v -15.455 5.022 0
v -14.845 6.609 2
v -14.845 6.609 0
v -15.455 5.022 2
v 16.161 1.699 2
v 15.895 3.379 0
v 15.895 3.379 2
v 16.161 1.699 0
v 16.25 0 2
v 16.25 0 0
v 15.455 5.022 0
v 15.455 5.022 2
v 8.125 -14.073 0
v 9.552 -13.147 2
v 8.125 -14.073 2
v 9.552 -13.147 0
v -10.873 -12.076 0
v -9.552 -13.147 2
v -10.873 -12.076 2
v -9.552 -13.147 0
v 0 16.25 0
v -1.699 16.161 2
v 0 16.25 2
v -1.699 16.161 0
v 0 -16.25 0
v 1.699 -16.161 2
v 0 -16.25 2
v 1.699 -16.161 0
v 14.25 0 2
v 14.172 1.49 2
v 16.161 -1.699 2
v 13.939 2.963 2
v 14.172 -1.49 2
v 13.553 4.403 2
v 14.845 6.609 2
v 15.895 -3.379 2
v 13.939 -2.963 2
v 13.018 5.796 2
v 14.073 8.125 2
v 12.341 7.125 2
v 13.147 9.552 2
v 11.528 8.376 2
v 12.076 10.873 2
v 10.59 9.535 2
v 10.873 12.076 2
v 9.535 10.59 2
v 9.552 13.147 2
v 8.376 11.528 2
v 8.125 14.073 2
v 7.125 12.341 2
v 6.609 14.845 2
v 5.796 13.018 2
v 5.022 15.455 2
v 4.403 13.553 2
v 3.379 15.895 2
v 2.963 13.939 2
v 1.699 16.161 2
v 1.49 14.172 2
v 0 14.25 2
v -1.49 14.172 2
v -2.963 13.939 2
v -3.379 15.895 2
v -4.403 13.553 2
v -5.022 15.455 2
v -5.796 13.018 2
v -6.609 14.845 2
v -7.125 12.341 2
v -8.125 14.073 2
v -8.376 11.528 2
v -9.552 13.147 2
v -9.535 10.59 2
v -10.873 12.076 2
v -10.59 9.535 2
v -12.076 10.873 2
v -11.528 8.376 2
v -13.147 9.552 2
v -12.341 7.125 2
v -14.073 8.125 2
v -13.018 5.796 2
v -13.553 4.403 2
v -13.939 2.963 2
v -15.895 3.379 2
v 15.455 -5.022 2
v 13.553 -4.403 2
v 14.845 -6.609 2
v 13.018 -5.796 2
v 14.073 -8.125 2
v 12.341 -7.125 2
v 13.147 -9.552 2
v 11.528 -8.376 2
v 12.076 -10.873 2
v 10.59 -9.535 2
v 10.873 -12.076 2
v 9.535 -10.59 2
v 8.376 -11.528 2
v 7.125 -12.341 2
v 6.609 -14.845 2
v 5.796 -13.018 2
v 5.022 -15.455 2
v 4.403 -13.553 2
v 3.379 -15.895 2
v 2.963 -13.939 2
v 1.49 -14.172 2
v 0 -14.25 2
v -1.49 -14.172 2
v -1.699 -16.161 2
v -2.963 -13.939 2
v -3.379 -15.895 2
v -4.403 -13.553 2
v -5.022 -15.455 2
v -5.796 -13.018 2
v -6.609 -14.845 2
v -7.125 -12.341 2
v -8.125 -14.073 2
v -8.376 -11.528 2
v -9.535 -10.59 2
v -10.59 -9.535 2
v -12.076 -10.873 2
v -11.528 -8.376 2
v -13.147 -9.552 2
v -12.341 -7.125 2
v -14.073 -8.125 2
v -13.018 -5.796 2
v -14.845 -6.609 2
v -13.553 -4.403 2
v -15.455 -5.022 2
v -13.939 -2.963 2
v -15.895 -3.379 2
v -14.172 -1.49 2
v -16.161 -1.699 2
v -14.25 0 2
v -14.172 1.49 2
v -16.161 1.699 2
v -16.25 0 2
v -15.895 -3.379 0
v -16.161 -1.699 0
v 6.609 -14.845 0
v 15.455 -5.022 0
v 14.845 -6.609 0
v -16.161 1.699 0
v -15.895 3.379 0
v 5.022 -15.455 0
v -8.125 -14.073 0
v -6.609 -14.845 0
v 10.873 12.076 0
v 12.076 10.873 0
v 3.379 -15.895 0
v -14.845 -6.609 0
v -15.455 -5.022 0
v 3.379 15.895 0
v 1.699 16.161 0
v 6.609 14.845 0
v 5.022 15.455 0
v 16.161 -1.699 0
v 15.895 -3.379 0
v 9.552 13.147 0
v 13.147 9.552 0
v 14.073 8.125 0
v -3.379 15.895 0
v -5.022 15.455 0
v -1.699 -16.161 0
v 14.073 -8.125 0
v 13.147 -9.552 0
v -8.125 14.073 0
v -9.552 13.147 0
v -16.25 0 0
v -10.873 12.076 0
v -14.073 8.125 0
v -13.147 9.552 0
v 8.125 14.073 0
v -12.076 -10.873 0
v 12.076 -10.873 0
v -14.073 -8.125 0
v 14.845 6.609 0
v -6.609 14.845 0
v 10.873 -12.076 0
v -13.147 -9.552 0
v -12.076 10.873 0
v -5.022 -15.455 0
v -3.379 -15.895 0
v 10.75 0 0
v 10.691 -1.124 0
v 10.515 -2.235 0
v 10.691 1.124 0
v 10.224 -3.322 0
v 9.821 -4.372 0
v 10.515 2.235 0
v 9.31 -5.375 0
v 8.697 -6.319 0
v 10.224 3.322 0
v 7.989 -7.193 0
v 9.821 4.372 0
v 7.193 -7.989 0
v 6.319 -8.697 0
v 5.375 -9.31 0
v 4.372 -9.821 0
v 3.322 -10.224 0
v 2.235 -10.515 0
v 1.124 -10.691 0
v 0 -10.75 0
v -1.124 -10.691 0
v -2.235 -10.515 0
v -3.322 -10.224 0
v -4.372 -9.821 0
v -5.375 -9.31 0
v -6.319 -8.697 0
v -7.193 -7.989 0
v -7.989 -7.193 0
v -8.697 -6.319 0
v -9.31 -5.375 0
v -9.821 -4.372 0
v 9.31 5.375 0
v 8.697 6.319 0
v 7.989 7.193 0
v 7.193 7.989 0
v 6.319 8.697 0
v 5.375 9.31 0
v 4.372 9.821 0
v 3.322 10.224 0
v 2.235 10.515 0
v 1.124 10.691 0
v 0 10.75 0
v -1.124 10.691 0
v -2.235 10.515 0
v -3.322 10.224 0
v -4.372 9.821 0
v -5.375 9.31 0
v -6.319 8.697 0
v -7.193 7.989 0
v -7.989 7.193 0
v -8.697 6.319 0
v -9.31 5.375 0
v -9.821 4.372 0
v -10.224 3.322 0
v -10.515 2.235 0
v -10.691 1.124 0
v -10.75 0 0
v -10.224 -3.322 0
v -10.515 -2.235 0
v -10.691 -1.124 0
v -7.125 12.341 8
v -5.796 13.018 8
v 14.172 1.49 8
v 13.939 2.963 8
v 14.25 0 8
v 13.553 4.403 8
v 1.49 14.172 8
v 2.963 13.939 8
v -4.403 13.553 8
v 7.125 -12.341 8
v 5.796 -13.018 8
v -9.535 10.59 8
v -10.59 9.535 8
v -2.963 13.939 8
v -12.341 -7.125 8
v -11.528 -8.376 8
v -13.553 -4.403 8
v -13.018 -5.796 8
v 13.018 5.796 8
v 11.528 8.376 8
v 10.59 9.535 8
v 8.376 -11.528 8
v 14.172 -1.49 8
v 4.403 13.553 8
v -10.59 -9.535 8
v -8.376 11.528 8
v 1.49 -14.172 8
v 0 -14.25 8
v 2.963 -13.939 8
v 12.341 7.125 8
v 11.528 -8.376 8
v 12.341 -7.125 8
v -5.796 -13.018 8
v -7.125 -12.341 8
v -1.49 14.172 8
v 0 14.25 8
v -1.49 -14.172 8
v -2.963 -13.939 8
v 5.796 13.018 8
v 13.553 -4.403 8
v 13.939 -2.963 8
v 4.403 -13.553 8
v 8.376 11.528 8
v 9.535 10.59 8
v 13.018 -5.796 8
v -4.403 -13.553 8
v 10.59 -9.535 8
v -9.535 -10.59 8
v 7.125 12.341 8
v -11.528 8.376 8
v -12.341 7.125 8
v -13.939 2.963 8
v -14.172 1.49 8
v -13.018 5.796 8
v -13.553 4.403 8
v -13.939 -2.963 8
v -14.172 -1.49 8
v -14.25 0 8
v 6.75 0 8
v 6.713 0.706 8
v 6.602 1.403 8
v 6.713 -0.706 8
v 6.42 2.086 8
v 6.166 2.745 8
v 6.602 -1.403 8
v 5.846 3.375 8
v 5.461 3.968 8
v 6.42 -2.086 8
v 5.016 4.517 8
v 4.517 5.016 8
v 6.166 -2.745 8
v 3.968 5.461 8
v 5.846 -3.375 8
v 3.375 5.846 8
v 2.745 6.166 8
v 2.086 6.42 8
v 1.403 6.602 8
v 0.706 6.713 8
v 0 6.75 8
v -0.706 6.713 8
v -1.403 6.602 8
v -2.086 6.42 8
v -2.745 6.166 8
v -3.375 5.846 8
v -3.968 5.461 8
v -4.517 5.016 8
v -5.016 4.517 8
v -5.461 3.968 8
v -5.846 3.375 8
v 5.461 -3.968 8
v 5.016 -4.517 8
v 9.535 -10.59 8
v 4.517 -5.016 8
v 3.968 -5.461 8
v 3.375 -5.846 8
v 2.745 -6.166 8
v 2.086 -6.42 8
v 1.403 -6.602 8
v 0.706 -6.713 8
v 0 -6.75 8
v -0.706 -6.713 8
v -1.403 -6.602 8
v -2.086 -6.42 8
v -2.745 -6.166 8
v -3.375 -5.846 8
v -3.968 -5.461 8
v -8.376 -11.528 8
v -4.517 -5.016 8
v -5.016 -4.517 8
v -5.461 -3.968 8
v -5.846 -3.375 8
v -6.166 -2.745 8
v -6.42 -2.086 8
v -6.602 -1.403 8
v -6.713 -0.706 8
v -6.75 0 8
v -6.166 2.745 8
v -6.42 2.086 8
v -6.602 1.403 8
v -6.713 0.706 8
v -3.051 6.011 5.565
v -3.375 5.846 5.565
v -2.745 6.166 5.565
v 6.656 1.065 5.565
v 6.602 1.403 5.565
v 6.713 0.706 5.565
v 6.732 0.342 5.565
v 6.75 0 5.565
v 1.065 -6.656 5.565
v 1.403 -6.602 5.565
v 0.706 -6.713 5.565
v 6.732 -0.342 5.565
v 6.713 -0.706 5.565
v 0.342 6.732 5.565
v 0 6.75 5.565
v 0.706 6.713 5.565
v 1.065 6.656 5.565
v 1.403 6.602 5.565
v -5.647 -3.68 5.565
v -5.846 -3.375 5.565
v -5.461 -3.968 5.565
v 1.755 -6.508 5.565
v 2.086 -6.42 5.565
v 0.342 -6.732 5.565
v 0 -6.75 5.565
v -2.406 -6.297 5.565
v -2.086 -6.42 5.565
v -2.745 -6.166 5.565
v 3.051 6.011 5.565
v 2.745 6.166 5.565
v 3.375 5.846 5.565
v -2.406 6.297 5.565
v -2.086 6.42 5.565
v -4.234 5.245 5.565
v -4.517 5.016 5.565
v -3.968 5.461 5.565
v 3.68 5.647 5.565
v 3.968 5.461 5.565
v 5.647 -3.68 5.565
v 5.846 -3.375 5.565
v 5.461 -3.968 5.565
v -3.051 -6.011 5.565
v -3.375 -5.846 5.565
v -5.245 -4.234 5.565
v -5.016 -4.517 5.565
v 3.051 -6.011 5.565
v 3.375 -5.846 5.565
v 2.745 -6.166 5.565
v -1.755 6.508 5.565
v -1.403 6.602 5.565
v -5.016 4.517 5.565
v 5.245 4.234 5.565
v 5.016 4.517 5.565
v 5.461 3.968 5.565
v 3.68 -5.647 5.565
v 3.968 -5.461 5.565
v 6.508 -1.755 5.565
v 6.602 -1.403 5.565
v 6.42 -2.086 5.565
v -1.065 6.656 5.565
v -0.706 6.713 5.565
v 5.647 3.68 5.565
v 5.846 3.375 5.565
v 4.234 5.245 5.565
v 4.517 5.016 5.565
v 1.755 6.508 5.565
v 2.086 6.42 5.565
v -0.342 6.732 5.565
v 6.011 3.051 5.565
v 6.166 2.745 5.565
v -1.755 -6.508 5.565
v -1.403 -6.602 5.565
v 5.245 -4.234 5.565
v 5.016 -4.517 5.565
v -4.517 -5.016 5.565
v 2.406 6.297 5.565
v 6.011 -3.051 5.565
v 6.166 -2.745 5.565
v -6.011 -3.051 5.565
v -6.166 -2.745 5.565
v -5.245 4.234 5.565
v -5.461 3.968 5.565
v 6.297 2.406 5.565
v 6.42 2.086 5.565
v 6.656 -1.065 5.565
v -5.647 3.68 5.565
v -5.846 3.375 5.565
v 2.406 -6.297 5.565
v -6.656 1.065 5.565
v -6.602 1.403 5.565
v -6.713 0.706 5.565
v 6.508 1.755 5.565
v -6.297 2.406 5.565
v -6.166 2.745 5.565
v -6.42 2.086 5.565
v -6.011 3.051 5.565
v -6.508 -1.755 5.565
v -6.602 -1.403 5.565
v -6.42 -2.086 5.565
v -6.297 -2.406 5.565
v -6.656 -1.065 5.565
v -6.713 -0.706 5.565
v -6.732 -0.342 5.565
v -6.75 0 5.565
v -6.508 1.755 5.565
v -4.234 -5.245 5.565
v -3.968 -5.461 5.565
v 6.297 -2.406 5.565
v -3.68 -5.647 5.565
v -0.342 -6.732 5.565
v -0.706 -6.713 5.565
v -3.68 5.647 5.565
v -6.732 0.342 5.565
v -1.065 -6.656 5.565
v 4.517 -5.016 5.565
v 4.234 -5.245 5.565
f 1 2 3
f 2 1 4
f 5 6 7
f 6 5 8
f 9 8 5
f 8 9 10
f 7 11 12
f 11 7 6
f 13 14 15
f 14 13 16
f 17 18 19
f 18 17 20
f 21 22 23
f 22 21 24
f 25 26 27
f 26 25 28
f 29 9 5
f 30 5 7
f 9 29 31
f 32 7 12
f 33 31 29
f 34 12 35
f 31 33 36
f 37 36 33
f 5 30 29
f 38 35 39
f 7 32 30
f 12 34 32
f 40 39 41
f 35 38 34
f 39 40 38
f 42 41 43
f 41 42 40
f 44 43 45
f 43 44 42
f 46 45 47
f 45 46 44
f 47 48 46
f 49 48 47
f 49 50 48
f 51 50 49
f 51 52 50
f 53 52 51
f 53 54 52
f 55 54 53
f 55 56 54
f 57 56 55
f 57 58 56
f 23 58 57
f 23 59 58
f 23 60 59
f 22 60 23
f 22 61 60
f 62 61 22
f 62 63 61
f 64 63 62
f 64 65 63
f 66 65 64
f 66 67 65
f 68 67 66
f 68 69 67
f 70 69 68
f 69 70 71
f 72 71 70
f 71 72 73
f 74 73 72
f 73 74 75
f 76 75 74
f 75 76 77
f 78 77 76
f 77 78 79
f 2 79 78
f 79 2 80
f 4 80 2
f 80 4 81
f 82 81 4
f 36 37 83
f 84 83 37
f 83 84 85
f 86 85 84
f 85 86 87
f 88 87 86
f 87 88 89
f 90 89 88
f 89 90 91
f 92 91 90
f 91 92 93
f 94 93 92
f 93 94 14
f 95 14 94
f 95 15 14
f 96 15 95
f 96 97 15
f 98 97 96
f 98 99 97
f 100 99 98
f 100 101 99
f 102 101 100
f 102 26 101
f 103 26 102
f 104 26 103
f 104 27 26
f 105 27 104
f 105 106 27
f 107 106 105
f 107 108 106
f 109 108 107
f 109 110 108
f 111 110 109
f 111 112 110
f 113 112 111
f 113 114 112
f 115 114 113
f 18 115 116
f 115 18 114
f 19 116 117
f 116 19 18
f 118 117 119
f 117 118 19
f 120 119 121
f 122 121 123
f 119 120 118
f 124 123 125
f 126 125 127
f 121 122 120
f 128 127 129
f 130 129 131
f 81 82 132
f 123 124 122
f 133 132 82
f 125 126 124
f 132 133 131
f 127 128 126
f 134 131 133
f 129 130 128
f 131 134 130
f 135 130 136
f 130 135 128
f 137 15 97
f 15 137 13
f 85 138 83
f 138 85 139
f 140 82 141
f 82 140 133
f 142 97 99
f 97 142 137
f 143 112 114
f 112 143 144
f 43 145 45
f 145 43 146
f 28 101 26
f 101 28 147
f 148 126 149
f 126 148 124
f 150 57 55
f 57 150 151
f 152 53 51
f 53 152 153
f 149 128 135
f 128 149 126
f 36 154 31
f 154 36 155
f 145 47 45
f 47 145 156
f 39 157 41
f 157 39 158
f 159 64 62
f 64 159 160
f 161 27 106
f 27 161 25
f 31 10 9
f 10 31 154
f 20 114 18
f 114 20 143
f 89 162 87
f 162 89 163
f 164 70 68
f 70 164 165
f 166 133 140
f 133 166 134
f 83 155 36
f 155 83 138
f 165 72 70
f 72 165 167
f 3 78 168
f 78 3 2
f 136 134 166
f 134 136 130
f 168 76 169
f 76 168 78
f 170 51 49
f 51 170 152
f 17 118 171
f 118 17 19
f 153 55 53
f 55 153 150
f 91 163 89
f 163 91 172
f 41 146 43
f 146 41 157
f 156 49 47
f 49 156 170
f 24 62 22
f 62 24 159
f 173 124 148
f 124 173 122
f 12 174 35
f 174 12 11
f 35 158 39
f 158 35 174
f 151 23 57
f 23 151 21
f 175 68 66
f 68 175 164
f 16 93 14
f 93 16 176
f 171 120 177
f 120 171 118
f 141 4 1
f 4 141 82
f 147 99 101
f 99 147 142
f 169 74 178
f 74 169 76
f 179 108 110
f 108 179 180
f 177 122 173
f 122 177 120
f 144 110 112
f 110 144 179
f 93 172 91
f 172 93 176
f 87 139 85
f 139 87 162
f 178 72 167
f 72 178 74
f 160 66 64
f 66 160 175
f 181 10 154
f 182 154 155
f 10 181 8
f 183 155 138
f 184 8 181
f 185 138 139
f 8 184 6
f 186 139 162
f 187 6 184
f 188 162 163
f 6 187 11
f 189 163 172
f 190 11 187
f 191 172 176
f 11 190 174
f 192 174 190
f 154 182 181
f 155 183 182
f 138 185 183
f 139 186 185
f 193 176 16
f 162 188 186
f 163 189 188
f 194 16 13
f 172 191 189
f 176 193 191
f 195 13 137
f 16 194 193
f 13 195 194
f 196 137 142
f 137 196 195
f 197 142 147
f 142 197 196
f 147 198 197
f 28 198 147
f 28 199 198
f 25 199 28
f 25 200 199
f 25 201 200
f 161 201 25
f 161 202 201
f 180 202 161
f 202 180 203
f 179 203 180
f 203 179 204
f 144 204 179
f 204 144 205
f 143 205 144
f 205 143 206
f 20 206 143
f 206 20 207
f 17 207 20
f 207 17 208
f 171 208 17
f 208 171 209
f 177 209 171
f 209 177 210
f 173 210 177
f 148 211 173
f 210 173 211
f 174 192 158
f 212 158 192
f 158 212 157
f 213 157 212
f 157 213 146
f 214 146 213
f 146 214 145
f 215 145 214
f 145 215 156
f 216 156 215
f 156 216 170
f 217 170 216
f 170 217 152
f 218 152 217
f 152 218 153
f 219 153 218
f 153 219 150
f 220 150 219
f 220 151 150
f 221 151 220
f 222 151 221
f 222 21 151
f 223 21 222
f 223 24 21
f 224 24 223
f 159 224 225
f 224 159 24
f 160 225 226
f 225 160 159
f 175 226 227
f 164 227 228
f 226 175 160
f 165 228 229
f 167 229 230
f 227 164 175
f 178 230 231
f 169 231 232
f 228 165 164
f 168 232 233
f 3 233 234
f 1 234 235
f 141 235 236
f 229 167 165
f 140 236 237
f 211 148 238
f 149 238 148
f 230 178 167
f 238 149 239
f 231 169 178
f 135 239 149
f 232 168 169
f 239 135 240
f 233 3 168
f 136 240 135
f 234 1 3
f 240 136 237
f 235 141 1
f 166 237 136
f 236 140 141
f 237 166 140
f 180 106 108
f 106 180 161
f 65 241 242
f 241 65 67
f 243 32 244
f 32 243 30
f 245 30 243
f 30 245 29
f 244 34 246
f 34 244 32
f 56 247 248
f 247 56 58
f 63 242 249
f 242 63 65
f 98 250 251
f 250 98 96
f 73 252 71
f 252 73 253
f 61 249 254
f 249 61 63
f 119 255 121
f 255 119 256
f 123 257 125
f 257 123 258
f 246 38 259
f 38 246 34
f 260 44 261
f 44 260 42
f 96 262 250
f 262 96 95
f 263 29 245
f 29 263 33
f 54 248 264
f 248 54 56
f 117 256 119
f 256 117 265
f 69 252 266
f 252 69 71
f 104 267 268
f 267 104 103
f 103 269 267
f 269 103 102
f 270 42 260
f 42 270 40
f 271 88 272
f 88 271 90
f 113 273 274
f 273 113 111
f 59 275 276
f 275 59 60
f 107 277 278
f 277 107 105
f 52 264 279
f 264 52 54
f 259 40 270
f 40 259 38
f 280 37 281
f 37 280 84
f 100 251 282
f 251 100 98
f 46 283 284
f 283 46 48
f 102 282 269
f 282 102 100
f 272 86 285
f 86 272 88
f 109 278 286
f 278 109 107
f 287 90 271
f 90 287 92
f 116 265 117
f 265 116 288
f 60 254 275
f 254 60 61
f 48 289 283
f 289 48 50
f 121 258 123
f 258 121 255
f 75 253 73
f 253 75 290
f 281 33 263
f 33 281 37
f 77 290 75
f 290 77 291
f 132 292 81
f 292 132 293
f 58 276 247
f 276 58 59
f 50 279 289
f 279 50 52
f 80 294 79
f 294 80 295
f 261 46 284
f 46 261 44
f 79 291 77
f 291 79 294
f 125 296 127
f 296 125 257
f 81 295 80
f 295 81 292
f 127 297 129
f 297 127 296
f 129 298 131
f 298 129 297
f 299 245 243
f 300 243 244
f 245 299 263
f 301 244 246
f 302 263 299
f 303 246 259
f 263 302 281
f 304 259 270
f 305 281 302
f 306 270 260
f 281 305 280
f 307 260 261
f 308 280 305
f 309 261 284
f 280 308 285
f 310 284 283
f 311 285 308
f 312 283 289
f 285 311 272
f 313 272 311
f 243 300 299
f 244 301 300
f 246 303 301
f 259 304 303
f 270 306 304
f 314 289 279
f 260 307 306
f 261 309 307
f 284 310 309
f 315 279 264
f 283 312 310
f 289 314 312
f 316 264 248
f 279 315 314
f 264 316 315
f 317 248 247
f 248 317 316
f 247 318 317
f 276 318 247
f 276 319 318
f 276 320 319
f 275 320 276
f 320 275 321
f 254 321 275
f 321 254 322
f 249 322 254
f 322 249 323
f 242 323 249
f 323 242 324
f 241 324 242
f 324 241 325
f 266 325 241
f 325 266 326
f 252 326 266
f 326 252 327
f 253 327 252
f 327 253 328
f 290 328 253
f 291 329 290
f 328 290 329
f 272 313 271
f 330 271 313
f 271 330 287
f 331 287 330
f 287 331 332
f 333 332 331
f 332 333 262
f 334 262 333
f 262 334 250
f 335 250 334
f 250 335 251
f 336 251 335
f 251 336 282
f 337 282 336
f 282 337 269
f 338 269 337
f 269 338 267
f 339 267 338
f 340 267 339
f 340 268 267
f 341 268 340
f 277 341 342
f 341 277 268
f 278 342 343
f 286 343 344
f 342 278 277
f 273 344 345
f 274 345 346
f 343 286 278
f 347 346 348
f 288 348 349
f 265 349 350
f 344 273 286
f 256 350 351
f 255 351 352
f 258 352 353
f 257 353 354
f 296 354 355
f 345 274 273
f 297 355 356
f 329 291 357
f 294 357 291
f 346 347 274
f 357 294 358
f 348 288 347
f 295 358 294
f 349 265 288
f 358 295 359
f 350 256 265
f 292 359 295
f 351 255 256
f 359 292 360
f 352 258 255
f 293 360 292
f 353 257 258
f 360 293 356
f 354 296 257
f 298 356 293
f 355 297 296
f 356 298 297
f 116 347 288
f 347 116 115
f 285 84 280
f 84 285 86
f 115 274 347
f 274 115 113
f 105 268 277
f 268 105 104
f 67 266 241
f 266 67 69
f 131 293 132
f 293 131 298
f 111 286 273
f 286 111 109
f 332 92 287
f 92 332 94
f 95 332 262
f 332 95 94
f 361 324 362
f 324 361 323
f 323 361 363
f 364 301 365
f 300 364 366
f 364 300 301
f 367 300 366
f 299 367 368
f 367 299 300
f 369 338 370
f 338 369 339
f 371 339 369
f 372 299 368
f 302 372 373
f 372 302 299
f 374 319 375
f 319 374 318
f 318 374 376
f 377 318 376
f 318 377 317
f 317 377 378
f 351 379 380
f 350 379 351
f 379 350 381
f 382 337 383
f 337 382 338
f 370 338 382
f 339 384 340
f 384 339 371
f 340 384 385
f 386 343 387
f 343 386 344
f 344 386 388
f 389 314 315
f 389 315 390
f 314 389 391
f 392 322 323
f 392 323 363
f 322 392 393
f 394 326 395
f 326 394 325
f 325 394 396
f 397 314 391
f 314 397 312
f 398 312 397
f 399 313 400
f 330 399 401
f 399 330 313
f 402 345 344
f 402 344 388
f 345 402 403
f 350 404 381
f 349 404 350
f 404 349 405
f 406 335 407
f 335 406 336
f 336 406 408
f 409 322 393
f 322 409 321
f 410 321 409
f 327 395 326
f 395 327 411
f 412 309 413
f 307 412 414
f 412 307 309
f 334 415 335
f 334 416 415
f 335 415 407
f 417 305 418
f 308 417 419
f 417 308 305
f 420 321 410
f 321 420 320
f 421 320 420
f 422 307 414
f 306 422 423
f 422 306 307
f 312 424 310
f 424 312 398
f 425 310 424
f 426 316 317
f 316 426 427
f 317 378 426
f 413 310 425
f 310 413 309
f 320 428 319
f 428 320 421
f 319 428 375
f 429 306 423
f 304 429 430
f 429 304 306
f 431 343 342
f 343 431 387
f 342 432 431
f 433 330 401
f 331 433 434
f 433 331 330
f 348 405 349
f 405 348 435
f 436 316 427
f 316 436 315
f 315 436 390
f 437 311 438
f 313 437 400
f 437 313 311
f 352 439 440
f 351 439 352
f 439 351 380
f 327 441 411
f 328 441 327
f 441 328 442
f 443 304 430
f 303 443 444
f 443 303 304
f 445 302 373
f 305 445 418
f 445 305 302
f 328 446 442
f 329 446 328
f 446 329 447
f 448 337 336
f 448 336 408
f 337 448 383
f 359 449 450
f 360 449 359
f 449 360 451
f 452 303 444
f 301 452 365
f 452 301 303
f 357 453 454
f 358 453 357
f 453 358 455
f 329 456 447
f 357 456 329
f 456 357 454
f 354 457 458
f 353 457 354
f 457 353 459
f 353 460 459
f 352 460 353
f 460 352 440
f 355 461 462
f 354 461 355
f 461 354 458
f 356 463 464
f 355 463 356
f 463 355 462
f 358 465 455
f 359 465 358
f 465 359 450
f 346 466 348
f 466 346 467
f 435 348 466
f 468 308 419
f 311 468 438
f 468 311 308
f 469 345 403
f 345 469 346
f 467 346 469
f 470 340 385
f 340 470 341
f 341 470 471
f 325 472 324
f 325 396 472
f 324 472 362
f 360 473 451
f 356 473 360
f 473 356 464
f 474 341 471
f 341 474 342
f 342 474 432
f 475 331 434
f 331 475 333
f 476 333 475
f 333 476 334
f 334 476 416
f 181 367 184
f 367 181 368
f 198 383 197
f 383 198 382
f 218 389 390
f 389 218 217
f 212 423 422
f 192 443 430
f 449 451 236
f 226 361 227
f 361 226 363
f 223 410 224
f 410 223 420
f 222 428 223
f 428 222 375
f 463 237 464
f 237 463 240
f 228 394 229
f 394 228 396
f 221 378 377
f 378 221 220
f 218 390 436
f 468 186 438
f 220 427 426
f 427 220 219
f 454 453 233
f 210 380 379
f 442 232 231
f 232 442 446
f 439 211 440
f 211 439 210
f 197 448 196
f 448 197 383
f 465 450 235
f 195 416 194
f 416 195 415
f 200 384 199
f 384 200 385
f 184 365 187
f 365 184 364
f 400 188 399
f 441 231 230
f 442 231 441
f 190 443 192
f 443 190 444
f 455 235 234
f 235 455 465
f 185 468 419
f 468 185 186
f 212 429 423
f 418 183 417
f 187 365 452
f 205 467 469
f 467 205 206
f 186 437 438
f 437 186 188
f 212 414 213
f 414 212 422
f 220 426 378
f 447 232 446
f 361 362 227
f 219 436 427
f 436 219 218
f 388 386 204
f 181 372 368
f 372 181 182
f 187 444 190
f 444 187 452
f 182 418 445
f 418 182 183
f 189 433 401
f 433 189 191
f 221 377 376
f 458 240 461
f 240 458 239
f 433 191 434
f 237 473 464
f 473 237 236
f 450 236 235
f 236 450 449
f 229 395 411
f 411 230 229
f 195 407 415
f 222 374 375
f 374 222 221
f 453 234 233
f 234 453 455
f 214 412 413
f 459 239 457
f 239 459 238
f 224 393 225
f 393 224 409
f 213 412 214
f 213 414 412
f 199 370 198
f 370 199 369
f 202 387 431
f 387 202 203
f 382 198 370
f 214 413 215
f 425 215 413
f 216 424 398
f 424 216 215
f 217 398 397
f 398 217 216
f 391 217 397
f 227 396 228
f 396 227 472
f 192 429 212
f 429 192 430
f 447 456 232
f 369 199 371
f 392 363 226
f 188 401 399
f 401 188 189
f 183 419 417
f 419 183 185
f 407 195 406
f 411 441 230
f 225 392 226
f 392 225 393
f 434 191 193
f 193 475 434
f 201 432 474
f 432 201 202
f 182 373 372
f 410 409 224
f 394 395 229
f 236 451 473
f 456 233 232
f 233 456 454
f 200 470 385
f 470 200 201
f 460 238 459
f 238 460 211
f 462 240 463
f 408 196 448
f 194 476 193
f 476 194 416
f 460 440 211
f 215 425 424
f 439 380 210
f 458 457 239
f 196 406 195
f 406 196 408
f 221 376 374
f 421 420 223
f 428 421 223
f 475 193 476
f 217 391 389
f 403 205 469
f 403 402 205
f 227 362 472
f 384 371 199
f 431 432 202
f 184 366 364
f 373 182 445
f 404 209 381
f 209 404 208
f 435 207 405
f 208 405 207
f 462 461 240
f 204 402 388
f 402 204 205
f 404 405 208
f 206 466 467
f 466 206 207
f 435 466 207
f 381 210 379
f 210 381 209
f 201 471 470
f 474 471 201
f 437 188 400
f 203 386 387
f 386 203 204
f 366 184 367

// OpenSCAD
// a Reductor to adapt 4 ml vacuette tube (greiner) to 4 in 1 Opentrons racks

DIA_IN = 13.5 ;
DIA_EXT = 28.5 ; 
DIA_COLERETTE = 28.5 + 4 ; 

Z1 = 8 ; 
Z2 = 2 ; 

$fn= 60 ; 

module  adaptator(){
    difference(){
    union(){
    cylinder(d = DIA_COLERETTE, h = Z2);
     cylinder(d= DIA_EXT, h = Z1) ; 
    }
    translate([0,0,-1])
    cylinder(d= DIA_IN, h = 50);
    
    cylinder(h=8, r1= DIA_IN/2 + 4, r2= 10/2);
    }
}


adaptator();
